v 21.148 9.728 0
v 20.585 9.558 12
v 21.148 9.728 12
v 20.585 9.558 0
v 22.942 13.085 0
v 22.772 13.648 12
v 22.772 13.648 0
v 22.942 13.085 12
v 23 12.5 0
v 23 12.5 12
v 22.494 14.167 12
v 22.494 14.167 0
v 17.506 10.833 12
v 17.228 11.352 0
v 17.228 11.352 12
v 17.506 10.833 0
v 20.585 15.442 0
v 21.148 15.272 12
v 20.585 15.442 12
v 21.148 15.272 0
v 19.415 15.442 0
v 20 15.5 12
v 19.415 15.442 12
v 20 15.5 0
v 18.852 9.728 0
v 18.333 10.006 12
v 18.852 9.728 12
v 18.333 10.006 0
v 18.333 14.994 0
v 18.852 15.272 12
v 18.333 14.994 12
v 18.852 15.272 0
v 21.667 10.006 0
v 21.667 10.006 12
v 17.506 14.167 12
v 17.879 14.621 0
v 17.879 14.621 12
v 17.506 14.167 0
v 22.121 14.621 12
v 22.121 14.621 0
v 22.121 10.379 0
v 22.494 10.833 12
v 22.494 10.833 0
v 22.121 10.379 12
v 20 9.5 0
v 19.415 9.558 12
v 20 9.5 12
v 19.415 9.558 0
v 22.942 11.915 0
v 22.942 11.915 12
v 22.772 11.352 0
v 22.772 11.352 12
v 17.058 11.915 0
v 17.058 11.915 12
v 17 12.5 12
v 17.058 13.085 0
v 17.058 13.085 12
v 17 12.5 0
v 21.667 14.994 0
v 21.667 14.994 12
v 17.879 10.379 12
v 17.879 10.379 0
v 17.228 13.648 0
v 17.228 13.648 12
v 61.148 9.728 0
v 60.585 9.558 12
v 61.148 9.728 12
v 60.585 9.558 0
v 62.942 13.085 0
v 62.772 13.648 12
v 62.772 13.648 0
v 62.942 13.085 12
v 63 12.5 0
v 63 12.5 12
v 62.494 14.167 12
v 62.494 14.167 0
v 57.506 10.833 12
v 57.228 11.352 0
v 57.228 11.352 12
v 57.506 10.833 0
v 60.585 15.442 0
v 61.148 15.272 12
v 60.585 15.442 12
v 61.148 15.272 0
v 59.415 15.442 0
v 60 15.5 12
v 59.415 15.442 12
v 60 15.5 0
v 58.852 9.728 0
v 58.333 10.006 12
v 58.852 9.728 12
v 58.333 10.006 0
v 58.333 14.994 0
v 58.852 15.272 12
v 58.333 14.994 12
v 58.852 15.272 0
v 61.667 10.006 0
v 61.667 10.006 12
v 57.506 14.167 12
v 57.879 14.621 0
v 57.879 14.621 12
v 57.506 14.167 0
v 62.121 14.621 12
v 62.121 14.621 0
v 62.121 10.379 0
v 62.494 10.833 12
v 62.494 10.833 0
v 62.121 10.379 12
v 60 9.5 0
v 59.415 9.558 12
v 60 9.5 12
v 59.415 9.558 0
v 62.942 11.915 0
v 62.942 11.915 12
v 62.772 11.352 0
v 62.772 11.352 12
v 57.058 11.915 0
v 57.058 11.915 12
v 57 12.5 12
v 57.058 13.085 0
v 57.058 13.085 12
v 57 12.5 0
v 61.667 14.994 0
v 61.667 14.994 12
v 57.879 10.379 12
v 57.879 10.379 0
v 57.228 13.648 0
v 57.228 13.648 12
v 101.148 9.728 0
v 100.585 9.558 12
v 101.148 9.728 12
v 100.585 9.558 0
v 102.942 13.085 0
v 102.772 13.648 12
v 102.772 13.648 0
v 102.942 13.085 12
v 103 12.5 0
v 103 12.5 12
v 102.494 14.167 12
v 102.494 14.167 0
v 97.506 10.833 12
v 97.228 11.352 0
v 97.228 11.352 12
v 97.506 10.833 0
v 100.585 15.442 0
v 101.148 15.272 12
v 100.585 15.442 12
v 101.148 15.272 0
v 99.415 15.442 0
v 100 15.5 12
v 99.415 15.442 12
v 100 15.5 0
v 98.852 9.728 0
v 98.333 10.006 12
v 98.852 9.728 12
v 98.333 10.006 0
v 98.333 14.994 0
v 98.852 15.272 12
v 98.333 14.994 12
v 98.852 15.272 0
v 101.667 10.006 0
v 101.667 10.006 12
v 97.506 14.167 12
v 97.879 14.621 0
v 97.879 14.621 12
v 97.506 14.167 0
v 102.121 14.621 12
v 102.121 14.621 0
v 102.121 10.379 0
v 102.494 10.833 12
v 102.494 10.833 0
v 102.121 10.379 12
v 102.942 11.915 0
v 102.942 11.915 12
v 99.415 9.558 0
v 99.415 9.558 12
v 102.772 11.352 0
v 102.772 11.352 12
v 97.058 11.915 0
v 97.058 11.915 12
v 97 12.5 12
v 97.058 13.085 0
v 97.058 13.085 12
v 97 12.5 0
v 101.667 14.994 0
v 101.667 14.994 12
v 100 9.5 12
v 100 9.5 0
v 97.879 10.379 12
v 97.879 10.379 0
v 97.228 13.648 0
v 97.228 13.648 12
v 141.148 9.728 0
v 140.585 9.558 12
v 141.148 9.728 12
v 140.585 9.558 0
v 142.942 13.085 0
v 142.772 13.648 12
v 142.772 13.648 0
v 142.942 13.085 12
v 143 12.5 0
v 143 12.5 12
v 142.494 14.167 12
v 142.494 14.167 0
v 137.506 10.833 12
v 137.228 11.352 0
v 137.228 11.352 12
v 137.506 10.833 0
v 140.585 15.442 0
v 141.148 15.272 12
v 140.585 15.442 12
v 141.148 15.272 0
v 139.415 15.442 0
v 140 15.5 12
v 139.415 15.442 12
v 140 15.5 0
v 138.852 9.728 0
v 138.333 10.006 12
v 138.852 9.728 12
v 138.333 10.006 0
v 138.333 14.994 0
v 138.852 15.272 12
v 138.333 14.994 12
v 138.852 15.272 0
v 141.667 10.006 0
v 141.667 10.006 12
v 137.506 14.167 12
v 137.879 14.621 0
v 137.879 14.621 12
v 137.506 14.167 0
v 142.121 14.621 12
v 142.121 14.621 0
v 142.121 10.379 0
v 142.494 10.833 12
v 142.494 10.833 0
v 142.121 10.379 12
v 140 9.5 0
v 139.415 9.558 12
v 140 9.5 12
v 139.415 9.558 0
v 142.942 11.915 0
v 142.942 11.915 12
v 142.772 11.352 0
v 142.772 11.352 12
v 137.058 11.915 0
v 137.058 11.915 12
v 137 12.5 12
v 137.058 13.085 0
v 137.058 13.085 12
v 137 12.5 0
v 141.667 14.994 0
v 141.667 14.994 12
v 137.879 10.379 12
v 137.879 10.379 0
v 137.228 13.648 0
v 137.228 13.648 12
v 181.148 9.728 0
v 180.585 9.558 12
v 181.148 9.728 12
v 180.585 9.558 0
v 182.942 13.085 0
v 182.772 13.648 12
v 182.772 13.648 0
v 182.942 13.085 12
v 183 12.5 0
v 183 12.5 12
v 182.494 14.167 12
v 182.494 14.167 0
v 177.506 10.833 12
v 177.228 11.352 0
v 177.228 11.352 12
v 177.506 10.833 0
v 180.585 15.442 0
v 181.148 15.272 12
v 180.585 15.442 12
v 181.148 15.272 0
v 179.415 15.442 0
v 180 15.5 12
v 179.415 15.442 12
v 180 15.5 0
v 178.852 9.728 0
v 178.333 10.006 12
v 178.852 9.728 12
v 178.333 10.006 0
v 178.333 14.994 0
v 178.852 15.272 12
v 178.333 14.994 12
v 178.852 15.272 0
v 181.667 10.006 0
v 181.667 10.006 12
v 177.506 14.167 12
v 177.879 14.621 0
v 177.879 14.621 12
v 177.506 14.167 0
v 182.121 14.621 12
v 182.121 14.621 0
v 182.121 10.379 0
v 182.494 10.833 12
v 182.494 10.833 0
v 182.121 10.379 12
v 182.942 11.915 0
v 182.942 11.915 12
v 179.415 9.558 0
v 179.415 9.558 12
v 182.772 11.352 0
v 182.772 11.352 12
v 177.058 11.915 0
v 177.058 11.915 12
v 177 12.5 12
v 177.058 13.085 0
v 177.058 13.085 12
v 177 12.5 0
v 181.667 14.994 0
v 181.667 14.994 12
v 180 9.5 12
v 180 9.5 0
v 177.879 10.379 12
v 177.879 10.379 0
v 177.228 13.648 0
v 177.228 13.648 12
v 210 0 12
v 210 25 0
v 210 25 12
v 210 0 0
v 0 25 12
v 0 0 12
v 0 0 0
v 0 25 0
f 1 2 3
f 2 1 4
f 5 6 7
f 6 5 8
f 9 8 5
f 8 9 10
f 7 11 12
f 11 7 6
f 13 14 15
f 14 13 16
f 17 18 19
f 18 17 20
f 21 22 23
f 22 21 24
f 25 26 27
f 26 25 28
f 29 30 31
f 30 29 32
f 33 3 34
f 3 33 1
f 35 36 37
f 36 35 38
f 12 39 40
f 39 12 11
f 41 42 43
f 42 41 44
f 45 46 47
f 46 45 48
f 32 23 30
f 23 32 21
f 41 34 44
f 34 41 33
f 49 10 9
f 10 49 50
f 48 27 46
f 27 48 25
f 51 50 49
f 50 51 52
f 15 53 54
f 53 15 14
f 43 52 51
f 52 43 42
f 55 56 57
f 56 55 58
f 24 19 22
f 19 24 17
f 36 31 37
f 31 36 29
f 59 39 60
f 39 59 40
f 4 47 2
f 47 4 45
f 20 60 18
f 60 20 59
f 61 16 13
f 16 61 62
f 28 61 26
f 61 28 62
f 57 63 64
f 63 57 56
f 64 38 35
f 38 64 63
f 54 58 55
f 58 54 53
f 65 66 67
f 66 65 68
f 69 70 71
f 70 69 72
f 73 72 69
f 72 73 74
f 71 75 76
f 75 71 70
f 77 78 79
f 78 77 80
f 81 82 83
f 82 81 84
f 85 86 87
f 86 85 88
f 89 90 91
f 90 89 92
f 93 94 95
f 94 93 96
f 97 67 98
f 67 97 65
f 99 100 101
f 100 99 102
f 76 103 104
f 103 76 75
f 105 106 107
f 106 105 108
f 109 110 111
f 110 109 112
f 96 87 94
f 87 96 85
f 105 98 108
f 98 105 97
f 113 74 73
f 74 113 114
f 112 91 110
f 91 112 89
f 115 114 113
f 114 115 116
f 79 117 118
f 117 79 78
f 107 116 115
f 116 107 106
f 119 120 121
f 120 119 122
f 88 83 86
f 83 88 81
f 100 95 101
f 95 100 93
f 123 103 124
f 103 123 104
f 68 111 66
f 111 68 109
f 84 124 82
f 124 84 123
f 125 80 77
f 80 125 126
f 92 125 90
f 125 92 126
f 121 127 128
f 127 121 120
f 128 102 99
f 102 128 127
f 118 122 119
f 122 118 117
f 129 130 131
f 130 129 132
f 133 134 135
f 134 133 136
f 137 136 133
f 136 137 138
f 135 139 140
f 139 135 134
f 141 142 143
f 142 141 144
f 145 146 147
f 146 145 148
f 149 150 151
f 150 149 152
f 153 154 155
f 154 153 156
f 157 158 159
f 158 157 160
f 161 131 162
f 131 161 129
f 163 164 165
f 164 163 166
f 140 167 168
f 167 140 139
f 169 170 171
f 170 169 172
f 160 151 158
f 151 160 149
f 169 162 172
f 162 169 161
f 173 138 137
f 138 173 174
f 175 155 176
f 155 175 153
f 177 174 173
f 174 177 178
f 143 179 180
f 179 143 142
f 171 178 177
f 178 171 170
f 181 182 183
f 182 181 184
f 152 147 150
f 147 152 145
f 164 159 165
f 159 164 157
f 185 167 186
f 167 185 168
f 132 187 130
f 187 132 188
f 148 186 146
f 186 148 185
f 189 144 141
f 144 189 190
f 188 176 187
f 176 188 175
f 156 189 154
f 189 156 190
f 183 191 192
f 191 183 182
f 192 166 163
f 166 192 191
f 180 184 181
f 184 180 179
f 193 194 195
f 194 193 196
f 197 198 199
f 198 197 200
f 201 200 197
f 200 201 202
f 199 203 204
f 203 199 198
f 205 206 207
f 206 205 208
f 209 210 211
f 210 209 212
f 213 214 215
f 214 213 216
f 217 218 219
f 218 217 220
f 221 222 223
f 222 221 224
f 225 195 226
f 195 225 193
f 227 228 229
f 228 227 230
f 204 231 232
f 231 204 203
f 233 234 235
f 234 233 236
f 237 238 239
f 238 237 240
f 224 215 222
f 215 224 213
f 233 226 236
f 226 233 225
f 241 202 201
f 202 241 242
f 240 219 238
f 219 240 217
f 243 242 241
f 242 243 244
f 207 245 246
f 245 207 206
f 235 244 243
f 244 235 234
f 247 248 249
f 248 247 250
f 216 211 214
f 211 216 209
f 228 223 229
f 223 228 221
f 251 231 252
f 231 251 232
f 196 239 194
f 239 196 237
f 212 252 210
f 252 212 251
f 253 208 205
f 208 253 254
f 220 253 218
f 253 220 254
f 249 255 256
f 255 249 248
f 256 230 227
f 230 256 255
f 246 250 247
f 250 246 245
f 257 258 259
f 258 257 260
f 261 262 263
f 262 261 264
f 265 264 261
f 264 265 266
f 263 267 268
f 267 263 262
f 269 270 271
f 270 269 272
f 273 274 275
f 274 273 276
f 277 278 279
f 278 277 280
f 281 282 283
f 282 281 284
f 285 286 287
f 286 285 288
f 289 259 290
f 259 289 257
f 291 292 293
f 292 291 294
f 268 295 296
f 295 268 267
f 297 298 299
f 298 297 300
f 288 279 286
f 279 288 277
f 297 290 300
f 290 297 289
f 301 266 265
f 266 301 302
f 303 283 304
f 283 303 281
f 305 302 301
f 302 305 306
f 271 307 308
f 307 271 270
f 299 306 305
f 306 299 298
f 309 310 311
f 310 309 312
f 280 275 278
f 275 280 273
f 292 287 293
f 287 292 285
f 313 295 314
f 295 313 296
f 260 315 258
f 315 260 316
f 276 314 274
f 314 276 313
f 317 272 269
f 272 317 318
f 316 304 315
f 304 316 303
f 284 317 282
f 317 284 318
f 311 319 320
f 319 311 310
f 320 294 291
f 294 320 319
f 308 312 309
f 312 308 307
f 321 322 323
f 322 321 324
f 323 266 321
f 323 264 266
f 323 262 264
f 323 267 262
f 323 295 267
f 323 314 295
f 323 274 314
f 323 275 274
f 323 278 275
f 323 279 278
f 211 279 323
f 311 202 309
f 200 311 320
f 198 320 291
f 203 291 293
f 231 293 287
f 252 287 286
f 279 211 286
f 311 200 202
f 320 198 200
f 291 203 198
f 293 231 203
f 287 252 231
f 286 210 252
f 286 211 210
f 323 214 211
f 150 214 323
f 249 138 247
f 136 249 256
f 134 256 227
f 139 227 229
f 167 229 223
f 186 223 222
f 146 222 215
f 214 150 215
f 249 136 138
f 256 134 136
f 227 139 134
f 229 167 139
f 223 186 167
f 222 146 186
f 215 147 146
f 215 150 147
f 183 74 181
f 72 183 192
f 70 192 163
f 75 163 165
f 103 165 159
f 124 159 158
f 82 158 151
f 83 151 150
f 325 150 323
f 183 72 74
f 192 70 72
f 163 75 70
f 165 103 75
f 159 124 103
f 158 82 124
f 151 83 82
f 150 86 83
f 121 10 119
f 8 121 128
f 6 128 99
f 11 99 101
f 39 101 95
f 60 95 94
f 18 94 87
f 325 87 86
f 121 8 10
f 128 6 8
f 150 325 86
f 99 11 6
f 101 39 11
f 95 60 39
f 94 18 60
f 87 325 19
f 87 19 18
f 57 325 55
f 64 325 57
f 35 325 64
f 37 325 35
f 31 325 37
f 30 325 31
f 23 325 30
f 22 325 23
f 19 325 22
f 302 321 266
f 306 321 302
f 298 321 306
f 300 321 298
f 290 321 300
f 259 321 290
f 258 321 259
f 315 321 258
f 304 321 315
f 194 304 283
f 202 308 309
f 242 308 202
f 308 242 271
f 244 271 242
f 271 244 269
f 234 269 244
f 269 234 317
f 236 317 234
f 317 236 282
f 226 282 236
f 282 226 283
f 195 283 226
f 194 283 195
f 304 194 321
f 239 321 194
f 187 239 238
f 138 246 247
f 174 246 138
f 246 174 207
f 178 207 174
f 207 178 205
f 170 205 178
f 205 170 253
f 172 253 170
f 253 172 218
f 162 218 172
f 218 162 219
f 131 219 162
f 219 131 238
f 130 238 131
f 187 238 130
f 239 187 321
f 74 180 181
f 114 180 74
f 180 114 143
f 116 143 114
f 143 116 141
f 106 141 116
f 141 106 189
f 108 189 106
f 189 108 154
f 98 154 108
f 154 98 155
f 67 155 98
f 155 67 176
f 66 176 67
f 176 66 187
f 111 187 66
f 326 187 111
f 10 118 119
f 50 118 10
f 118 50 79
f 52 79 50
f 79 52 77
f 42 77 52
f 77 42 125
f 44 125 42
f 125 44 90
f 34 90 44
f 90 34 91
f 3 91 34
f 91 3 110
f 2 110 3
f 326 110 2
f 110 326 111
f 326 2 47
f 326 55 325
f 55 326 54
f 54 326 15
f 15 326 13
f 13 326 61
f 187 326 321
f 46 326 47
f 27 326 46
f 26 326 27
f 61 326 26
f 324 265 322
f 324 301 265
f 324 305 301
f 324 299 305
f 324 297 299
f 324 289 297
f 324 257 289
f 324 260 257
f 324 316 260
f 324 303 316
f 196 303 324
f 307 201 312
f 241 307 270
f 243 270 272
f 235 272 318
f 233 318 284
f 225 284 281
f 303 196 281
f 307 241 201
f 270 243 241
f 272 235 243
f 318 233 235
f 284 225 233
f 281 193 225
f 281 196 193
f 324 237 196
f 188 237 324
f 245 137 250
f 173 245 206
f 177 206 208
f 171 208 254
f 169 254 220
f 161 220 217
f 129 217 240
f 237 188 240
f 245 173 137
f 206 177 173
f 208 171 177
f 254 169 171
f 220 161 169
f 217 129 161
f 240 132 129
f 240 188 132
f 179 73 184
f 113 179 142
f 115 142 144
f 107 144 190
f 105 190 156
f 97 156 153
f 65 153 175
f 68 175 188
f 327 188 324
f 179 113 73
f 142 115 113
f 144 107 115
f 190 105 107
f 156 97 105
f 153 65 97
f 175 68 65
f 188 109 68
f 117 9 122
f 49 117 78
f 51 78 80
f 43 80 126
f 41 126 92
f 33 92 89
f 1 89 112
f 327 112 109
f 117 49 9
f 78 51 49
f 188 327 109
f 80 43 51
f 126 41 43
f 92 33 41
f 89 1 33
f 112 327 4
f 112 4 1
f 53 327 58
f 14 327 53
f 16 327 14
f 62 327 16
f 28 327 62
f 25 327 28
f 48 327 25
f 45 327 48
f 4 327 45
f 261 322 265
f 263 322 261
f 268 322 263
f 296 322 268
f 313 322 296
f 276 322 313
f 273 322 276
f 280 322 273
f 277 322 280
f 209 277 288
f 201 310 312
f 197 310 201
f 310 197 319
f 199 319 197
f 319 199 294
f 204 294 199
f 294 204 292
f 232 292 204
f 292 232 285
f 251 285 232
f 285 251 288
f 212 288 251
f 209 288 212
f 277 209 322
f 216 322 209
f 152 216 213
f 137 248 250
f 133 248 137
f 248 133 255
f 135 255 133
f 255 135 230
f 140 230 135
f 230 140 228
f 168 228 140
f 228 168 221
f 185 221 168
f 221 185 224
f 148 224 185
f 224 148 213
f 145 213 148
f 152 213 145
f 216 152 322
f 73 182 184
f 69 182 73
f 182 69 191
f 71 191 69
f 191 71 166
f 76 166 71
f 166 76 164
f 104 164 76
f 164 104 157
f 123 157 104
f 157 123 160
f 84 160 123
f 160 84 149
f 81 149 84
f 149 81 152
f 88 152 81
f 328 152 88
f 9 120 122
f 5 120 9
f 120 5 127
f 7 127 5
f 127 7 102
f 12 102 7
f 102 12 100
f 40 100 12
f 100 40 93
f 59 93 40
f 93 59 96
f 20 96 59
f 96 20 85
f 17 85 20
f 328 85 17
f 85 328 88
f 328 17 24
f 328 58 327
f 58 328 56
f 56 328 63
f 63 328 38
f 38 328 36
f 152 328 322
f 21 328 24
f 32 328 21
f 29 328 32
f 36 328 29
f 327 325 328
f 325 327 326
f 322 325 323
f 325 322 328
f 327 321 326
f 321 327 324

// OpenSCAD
$fn = 32;

// ----------------------------------------------------------------------
// Long rail: 200-250 mm mounting rail
// ----------------------------------------------------------------------

// --- parameters (mm) ---
rail_l = 210;             // rail length, X
rail_w = 25;              // rail width, Y
rail_t = 12;              // rail thickness, Z
hole_d = 6;               // mounting hole diameter
hole_start = 20;          // first hole offset from the end
hole_pitch = 40;          // hole pitch
holes = 5;                // number of holes

difference() {
  cube([rail_l, rail_w, rail_t]);
  for (i = [0 : holes - 1])
    translate([hole_start + i * hole_pitch, rail_w / 2, -1])
      cylinder(h = rail_t + 2, d = hole_d);
}
